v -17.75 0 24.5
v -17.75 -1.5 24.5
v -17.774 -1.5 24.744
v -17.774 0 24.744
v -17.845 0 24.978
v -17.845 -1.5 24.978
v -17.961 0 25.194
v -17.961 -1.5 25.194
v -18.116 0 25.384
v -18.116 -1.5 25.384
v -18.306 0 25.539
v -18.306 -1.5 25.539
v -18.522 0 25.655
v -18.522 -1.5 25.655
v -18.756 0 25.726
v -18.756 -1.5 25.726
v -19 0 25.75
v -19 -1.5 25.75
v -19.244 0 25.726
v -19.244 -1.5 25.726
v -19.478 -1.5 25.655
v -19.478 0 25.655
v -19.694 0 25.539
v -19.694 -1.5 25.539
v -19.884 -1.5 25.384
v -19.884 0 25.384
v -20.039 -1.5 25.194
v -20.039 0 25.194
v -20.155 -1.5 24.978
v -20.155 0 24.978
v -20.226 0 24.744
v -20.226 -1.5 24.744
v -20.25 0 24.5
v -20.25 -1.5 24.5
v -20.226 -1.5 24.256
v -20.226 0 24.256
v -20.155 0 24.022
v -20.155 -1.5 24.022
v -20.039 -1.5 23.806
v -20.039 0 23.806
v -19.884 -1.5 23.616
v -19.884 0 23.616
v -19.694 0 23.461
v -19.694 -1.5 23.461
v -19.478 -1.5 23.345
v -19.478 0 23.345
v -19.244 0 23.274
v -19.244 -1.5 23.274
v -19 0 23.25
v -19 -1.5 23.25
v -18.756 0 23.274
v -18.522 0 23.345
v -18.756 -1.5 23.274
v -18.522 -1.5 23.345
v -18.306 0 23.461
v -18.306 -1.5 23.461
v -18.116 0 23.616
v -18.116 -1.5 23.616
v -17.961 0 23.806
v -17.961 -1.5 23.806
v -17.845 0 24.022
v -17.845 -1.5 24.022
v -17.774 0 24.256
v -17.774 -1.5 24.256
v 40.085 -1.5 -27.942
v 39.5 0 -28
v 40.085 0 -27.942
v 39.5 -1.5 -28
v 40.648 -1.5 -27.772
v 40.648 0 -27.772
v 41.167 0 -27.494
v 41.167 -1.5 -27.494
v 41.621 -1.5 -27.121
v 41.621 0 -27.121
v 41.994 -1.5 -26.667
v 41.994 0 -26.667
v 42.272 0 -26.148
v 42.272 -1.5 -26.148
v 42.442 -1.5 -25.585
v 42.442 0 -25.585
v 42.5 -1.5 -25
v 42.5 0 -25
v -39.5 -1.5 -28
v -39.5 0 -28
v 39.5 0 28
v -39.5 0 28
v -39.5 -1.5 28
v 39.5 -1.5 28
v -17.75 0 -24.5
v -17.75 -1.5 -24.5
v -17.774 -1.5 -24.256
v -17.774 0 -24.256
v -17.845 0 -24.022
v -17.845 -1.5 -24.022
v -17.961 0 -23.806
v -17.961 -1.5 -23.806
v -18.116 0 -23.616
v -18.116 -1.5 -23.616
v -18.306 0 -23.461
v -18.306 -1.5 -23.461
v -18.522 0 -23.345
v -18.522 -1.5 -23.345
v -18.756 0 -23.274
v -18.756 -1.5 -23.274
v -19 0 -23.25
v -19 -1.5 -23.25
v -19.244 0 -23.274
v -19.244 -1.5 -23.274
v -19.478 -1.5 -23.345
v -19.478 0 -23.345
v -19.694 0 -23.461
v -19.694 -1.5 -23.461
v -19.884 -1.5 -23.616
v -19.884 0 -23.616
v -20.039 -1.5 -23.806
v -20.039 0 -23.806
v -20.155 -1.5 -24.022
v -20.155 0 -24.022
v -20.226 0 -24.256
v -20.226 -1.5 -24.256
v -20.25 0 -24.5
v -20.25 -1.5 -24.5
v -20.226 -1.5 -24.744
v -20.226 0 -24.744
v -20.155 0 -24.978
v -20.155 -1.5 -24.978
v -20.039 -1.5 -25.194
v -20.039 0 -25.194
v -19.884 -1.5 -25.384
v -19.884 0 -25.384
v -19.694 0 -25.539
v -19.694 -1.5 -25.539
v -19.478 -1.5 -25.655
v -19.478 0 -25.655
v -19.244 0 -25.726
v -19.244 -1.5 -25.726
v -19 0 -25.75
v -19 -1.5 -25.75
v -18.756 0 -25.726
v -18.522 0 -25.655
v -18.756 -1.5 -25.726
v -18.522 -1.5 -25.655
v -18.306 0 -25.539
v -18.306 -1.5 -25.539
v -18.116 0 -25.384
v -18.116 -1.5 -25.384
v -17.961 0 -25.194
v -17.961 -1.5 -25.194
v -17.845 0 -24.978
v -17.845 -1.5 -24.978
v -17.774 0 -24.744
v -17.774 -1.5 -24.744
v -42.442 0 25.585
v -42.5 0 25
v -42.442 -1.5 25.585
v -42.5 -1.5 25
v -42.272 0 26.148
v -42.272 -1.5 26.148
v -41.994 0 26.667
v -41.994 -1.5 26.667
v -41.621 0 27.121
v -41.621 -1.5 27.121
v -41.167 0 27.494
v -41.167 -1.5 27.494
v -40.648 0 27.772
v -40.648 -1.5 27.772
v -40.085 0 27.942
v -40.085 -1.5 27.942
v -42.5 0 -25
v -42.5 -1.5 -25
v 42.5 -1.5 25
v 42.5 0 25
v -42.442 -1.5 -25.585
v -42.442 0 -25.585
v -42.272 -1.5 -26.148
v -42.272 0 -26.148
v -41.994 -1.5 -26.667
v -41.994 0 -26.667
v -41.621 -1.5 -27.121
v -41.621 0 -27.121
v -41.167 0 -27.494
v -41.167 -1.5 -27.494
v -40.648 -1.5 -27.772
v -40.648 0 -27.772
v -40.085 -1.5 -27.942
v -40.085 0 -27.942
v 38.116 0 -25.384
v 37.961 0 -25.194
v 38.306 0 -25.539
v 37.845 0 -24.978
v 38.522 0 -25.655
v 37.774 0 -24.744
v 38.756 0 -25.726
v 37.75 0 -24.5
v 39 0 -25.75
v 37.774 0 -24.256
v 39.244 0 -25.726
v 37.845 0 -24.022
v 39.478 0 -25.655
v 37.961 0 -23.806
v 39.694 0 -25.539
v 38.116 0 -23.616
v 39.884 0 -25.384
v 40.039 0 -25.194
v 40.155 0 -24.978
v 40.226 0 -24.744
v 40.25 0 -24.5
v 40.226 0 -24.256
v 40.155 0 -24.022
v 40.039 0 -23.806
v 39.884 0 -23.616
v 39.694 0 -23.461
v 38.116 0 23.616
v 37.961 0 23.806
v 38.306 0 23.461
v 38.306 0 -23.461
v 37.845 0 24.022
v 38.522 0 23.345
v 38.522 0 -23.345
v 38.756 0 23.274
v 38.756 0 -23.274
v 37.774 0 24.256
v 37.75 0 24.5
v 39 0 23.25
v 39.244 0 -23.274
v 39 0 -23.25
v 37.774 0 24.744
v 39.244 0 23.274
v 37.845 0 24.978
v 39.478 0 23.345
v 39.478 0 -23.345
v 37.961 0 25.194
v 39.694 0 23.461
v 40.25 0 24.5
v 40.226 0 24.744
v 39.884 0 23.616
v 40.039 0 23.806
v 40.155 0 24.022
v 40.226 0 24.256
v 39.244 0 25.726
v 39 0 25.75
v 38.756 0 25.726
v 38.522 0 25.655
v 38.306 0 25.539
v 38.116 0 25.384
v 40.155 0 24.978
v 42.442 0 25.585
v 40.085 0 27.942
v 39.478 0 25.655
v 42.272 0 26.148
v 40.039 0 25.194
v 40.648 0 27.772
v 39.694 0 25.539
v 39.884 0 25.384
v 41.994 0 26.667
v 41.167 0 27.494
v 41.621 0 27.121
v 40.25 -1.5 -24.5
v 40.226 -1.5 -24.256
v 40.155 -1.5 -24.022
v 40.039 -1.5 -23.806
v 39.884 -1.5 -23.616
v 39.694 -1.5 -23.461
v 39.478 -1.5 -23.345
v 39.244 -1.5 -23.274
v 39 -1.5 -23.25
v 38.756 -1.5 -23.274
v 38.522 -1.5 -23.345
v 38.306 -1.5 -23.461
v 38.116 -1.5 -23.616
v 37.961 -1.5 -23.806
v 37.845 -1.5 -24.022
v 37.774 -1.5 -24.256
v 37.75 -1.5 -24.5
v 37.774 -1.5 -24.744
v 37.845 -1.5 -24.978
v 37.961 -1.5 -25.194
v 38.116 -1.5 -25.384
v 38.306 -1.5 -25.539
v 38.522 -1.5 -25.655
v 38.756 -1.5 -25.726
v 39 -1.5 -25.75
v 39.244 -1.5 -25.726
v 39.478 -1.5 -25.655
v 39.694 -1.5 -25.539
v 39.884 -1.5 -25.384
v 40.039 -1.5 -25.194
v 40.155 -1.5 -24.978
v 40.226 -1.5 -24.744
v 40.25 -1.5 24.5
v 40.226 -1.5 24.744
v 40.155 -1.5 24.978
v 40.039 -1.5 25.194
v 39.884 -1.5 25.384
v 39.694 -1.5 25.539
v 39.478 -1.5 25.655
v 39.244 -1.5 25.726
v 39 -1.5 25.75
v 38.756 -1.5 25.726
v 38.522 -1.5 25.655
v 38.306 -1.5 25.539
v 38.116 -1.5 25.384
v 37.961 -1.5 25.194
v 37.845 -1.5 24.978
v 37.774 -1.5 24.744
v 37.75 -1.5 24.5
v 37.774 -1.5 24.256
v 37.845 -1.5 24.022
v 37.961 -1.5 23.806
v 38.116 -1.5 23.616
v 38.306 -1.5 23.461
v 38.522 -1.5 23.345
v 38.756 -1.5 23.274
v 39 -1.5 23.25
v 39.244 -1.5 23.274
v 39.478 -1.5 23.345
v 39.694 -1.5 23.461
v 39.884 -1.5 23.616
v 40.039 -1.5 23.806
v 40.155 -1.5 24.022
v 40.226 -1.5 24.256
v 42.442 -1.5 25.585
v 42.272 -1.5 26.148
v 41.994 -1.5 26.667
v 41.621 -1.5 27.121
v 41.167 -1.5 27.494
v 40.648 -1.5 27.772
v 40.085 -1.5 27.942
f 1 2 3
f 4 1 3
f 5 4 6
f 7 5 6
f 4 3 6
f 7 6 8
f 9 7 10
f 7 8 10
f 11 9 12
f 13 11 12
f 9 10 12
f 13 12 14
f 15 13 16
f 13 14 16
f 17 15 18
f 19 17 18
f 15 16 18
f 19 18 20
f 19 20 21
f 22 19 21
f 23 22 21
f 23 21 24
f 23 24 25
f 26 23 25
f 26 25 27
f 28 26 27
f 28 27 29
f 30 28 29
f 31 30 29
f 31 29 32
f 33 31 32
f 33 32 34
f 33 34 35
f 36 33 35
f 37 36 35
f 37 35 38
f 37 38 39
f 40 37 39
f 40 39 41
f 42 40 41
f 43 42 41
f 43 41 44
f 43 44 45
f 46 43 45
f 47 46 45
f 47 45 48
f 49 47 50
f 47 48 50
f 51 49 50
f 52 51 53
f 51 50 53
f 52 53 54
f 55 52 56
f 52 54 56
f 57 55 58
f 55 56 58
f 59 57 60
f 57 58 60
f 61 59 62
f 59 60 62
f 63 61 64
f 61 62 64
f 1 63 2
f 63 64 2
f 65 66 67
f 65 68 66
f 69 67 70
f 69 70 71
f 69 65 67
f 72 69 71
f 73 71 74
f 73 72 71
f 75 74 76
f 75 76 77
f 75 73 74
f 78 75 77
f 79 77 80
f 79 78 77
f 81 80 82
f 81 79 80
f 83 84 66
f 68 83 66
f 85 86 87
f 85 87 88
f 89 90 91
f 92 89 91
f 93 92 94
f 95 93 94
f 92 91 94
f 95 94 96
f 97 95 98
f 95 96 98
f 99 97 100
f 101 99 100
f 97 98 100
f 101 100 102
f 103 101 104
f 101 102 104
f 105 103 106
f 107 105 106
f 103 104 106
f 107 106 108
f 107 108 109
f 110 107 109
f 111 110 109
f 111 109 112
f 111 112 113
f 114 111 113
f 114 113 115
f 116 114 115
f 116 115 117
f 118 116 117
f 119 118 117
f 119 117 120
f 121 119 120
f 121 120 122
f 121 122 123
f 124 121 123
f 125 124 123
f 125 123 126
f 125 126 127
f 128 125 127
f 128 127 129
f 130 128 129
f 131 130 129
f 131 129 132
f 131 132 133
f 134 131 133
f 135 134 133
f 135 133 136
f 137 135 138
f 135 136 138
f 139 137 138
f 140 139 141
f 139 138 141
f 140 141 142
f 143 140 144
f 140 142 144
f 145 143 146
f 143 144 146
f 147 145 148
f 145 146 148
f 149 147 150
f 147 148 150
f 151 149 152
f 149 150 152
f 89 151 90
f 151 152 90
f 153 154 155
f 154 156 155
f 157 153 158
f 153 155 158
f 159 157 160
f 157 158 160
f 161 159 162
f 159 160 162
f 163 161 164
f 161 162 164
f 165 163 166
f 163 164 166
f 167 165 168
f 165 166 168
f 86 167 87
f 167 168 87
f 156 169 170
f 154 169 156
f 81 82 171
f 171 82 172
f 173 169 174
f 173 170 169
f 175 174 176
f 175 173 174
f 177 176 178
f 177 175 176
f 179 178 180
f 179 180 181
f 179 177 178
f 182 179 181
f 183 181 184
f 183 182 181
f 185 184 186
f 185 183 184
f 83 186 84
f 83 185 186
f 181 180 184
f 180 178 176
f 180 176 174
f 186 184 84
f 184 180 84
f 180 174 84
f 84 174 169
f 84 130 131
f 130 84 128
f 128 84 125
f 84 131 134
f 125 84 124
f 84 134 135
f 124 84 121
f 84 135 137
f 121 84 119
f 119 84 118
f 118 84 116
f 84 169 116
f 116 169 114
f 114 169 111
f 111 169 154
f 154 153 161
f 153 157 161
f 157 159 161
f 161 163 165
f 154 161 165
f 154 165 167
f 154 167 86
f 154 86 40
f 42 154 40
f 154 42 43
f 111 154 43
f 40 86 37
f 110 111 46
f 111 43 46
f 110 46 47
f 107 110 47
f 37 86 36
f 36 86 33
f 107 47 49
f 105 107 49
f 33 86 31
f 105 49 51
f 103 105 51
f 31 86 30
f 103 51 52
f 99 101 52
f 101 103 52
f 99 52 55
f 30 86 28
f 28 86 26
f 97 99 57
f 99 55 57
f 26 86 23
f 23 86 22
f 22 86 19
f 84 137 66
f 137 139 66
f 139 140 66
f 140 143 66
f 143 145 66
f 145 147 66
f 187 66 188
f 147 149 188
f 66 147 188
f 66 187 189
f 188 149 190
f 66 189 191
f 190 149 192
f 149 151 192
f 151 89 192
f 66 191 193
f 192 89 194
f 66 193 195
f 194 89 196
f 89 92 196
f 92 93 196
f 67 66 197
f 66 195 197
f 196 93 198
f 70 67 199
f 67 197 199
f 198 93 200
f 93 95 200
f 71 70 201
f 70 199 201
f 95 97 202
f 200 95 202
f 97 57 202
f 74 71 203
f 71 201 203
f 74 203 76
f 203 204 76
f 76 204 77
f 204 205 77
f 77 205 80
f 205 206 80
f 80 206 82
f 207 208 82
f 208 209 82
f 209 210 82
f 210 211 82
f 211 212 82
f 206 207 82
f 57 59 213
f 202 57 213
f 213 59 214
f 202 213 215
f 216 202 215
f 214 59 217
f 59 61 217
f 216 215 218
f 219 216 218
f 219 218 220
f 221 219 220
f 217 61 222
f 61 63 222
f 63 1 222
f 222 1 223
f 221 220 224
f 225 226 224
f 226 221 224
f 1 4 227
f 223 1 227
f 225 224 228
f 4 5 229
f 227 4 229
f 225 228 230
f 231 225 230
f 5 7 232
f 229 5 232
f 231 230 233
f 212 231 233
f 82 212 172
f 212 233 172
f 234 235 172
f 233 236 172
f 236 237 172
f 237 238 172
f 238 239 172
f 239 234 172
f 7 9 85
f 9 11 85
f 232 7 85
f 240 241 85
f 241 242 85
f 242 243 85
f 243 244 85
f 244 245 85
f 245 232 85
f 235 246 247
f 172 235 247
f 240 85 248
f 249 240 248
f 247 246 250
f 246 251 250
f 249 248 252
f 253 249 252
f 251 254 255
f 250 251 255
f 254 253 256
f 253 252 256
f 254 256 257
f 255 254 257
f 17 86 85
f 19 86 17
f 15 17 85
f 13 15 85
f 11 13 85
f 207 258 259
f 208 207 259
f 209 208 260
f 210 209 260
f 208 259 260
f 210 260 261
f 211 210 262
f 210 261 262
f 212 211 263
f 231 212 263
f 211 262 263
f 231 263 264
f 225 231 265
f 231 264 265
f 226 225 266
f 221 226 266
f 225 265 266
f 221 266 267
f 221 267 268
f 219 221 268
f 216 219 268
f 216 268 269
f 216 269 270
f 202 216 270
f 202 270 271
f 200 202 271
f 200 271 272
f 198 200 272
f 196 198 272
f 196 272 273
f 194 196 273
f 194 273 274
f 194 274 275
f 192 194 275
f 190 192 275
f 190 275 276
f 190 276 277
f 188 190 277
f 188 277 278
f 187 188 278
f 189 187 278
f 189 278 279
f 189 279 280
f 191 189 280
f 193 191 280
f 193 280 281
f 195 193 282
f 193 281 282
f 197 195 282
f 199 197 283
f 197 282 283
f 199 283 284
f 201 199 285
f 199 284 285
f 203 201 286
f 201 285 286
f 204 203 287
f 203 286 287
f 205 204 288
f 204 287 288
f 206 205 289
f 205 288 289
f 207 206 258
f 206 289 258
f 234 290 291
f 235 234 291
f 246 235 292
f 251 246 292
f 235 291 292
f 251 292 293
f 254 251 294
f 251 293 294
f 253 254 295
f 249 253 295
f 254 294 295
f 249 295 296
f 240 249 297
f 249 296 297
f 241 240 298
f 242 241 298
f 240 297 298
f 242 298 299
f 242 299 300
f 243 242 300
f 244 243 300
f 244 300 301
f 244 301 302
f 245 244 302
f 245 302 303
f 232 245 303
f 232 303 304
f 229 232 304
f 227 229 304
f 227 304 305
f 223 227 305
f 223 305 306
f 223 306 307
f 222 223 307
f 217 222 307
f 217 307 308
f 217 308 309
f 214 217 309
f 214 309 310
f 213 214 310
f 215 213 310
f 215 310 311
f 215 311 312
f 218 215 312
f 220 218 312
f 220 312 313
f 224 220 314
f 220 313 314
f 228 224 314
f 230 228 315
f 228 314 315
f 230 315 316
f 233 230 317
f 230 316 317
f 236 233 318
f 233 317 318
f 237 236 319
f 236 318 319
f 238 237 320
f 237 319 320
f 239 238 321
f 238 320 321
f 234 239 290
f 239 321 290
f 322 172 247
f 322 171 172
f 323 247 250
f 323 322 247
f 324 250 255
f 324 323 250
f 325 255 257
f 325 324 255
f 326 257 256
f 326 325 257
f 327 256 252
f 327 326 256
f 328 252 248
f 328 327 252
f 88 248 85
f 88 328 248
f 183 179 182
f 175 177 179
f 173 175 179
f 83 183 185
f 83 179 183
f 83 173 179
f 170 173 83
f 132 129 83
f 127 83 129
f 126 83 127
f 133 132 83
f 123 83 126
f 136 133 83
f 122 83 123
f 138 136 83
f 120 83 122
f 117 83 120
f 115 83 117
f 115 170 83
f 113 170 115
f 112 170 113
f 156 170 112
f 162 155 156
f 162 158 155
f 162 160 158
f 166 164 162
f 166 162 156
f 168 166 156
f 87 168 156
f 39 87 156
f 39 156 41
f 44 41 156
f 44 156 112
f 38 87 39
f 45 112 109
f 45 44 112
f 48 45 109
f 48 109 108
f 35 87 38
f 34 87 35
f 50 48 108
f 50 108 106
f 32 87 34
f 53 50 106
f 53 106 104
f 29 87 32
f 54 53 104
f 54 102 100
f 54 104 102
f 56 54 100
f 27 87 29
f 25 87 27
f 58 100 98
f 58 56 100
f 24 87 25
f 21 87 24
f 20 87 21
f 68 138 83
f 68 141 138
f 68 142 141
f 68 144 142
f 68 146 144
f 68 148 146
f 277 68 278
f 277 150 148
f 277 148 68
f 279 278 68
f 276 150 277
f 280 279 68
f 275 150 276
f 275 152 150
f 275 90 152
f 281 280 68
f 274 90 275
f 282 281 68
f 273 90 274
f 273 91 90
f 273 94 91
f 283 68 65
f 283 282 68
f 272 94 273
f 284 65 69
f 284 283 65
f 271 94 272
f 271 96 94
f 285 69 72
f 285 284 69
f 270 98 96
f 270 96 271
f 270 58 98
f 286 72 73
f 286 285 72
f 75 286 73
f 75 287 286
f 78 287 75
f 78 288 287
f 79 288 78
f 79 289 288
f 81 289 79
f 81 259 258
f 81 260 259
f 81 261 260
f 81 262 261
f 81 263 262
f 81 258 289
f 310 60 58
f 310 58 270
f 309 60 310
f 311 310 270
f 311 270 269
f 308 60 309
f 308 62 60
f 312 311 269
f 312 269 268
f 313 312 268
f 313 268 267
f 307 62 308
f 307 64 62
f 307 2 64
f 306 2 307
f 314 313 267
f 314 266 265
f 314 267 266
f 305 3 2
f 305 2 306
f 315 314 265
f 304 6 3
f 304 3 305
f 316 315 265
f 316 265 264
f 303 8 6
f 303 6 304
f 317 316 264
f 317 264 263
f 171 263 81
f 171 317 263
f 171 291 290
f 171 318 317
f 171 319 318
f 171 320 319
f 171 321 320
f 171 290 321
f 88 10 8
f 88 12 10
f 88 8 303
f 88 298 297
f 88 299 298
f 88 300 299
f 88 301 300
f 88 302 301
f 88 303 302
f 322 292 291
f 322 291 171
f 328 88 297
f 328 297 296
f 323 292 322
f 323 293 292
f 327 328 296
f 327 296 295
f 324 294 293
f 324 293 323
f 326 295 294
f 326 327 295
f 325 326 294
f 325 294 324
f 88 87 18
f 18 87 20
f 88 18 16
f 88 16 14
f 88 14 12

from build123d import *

# Parameters (mm, degrees)
F0_W     = 85
F0_H     = 56
F1_DEPTH = 1.5
F2_R     = 3
F3_R     = 1.25
F4_DEPTH = 1.501


with BuildPart() as f1:
    # F0 (on Front) → F1 (new body)
    with BuildSketch(Plane.XZ):
        Rectangle(F0_W, F0_H)
    extrude(amount=F1_DEPTH)

    # F2
    f2_edges = [f1.edges().sort_by_distance(p)[0] for p in [
        (-42.5, -0.75, 28),
        (42.5, -0.75, 28),
        (42.5, -0.75, -28),
        (-42.5, -0.75, -28),
    ]]
    fillet(f2_edges, radius=F2_R)

    # F3 (on face) → F4 (cut, through all)
    with BuildSketch(Plane.XZ.offset(1.5)):
        with Locations((39, 24.5)):
            Circle(F3_R)
        with Locations((-19, 24.5)):
            Circle(F3_R)
        with Locations((-19, -24.5)):
            Circle(F3_R)
        with Locations((39, -24.5)):
            Circle(F3_R)
    extrude(amount=-F4_DEPTH, mode=Mode.SUBTRACT)


solid = f1.part
